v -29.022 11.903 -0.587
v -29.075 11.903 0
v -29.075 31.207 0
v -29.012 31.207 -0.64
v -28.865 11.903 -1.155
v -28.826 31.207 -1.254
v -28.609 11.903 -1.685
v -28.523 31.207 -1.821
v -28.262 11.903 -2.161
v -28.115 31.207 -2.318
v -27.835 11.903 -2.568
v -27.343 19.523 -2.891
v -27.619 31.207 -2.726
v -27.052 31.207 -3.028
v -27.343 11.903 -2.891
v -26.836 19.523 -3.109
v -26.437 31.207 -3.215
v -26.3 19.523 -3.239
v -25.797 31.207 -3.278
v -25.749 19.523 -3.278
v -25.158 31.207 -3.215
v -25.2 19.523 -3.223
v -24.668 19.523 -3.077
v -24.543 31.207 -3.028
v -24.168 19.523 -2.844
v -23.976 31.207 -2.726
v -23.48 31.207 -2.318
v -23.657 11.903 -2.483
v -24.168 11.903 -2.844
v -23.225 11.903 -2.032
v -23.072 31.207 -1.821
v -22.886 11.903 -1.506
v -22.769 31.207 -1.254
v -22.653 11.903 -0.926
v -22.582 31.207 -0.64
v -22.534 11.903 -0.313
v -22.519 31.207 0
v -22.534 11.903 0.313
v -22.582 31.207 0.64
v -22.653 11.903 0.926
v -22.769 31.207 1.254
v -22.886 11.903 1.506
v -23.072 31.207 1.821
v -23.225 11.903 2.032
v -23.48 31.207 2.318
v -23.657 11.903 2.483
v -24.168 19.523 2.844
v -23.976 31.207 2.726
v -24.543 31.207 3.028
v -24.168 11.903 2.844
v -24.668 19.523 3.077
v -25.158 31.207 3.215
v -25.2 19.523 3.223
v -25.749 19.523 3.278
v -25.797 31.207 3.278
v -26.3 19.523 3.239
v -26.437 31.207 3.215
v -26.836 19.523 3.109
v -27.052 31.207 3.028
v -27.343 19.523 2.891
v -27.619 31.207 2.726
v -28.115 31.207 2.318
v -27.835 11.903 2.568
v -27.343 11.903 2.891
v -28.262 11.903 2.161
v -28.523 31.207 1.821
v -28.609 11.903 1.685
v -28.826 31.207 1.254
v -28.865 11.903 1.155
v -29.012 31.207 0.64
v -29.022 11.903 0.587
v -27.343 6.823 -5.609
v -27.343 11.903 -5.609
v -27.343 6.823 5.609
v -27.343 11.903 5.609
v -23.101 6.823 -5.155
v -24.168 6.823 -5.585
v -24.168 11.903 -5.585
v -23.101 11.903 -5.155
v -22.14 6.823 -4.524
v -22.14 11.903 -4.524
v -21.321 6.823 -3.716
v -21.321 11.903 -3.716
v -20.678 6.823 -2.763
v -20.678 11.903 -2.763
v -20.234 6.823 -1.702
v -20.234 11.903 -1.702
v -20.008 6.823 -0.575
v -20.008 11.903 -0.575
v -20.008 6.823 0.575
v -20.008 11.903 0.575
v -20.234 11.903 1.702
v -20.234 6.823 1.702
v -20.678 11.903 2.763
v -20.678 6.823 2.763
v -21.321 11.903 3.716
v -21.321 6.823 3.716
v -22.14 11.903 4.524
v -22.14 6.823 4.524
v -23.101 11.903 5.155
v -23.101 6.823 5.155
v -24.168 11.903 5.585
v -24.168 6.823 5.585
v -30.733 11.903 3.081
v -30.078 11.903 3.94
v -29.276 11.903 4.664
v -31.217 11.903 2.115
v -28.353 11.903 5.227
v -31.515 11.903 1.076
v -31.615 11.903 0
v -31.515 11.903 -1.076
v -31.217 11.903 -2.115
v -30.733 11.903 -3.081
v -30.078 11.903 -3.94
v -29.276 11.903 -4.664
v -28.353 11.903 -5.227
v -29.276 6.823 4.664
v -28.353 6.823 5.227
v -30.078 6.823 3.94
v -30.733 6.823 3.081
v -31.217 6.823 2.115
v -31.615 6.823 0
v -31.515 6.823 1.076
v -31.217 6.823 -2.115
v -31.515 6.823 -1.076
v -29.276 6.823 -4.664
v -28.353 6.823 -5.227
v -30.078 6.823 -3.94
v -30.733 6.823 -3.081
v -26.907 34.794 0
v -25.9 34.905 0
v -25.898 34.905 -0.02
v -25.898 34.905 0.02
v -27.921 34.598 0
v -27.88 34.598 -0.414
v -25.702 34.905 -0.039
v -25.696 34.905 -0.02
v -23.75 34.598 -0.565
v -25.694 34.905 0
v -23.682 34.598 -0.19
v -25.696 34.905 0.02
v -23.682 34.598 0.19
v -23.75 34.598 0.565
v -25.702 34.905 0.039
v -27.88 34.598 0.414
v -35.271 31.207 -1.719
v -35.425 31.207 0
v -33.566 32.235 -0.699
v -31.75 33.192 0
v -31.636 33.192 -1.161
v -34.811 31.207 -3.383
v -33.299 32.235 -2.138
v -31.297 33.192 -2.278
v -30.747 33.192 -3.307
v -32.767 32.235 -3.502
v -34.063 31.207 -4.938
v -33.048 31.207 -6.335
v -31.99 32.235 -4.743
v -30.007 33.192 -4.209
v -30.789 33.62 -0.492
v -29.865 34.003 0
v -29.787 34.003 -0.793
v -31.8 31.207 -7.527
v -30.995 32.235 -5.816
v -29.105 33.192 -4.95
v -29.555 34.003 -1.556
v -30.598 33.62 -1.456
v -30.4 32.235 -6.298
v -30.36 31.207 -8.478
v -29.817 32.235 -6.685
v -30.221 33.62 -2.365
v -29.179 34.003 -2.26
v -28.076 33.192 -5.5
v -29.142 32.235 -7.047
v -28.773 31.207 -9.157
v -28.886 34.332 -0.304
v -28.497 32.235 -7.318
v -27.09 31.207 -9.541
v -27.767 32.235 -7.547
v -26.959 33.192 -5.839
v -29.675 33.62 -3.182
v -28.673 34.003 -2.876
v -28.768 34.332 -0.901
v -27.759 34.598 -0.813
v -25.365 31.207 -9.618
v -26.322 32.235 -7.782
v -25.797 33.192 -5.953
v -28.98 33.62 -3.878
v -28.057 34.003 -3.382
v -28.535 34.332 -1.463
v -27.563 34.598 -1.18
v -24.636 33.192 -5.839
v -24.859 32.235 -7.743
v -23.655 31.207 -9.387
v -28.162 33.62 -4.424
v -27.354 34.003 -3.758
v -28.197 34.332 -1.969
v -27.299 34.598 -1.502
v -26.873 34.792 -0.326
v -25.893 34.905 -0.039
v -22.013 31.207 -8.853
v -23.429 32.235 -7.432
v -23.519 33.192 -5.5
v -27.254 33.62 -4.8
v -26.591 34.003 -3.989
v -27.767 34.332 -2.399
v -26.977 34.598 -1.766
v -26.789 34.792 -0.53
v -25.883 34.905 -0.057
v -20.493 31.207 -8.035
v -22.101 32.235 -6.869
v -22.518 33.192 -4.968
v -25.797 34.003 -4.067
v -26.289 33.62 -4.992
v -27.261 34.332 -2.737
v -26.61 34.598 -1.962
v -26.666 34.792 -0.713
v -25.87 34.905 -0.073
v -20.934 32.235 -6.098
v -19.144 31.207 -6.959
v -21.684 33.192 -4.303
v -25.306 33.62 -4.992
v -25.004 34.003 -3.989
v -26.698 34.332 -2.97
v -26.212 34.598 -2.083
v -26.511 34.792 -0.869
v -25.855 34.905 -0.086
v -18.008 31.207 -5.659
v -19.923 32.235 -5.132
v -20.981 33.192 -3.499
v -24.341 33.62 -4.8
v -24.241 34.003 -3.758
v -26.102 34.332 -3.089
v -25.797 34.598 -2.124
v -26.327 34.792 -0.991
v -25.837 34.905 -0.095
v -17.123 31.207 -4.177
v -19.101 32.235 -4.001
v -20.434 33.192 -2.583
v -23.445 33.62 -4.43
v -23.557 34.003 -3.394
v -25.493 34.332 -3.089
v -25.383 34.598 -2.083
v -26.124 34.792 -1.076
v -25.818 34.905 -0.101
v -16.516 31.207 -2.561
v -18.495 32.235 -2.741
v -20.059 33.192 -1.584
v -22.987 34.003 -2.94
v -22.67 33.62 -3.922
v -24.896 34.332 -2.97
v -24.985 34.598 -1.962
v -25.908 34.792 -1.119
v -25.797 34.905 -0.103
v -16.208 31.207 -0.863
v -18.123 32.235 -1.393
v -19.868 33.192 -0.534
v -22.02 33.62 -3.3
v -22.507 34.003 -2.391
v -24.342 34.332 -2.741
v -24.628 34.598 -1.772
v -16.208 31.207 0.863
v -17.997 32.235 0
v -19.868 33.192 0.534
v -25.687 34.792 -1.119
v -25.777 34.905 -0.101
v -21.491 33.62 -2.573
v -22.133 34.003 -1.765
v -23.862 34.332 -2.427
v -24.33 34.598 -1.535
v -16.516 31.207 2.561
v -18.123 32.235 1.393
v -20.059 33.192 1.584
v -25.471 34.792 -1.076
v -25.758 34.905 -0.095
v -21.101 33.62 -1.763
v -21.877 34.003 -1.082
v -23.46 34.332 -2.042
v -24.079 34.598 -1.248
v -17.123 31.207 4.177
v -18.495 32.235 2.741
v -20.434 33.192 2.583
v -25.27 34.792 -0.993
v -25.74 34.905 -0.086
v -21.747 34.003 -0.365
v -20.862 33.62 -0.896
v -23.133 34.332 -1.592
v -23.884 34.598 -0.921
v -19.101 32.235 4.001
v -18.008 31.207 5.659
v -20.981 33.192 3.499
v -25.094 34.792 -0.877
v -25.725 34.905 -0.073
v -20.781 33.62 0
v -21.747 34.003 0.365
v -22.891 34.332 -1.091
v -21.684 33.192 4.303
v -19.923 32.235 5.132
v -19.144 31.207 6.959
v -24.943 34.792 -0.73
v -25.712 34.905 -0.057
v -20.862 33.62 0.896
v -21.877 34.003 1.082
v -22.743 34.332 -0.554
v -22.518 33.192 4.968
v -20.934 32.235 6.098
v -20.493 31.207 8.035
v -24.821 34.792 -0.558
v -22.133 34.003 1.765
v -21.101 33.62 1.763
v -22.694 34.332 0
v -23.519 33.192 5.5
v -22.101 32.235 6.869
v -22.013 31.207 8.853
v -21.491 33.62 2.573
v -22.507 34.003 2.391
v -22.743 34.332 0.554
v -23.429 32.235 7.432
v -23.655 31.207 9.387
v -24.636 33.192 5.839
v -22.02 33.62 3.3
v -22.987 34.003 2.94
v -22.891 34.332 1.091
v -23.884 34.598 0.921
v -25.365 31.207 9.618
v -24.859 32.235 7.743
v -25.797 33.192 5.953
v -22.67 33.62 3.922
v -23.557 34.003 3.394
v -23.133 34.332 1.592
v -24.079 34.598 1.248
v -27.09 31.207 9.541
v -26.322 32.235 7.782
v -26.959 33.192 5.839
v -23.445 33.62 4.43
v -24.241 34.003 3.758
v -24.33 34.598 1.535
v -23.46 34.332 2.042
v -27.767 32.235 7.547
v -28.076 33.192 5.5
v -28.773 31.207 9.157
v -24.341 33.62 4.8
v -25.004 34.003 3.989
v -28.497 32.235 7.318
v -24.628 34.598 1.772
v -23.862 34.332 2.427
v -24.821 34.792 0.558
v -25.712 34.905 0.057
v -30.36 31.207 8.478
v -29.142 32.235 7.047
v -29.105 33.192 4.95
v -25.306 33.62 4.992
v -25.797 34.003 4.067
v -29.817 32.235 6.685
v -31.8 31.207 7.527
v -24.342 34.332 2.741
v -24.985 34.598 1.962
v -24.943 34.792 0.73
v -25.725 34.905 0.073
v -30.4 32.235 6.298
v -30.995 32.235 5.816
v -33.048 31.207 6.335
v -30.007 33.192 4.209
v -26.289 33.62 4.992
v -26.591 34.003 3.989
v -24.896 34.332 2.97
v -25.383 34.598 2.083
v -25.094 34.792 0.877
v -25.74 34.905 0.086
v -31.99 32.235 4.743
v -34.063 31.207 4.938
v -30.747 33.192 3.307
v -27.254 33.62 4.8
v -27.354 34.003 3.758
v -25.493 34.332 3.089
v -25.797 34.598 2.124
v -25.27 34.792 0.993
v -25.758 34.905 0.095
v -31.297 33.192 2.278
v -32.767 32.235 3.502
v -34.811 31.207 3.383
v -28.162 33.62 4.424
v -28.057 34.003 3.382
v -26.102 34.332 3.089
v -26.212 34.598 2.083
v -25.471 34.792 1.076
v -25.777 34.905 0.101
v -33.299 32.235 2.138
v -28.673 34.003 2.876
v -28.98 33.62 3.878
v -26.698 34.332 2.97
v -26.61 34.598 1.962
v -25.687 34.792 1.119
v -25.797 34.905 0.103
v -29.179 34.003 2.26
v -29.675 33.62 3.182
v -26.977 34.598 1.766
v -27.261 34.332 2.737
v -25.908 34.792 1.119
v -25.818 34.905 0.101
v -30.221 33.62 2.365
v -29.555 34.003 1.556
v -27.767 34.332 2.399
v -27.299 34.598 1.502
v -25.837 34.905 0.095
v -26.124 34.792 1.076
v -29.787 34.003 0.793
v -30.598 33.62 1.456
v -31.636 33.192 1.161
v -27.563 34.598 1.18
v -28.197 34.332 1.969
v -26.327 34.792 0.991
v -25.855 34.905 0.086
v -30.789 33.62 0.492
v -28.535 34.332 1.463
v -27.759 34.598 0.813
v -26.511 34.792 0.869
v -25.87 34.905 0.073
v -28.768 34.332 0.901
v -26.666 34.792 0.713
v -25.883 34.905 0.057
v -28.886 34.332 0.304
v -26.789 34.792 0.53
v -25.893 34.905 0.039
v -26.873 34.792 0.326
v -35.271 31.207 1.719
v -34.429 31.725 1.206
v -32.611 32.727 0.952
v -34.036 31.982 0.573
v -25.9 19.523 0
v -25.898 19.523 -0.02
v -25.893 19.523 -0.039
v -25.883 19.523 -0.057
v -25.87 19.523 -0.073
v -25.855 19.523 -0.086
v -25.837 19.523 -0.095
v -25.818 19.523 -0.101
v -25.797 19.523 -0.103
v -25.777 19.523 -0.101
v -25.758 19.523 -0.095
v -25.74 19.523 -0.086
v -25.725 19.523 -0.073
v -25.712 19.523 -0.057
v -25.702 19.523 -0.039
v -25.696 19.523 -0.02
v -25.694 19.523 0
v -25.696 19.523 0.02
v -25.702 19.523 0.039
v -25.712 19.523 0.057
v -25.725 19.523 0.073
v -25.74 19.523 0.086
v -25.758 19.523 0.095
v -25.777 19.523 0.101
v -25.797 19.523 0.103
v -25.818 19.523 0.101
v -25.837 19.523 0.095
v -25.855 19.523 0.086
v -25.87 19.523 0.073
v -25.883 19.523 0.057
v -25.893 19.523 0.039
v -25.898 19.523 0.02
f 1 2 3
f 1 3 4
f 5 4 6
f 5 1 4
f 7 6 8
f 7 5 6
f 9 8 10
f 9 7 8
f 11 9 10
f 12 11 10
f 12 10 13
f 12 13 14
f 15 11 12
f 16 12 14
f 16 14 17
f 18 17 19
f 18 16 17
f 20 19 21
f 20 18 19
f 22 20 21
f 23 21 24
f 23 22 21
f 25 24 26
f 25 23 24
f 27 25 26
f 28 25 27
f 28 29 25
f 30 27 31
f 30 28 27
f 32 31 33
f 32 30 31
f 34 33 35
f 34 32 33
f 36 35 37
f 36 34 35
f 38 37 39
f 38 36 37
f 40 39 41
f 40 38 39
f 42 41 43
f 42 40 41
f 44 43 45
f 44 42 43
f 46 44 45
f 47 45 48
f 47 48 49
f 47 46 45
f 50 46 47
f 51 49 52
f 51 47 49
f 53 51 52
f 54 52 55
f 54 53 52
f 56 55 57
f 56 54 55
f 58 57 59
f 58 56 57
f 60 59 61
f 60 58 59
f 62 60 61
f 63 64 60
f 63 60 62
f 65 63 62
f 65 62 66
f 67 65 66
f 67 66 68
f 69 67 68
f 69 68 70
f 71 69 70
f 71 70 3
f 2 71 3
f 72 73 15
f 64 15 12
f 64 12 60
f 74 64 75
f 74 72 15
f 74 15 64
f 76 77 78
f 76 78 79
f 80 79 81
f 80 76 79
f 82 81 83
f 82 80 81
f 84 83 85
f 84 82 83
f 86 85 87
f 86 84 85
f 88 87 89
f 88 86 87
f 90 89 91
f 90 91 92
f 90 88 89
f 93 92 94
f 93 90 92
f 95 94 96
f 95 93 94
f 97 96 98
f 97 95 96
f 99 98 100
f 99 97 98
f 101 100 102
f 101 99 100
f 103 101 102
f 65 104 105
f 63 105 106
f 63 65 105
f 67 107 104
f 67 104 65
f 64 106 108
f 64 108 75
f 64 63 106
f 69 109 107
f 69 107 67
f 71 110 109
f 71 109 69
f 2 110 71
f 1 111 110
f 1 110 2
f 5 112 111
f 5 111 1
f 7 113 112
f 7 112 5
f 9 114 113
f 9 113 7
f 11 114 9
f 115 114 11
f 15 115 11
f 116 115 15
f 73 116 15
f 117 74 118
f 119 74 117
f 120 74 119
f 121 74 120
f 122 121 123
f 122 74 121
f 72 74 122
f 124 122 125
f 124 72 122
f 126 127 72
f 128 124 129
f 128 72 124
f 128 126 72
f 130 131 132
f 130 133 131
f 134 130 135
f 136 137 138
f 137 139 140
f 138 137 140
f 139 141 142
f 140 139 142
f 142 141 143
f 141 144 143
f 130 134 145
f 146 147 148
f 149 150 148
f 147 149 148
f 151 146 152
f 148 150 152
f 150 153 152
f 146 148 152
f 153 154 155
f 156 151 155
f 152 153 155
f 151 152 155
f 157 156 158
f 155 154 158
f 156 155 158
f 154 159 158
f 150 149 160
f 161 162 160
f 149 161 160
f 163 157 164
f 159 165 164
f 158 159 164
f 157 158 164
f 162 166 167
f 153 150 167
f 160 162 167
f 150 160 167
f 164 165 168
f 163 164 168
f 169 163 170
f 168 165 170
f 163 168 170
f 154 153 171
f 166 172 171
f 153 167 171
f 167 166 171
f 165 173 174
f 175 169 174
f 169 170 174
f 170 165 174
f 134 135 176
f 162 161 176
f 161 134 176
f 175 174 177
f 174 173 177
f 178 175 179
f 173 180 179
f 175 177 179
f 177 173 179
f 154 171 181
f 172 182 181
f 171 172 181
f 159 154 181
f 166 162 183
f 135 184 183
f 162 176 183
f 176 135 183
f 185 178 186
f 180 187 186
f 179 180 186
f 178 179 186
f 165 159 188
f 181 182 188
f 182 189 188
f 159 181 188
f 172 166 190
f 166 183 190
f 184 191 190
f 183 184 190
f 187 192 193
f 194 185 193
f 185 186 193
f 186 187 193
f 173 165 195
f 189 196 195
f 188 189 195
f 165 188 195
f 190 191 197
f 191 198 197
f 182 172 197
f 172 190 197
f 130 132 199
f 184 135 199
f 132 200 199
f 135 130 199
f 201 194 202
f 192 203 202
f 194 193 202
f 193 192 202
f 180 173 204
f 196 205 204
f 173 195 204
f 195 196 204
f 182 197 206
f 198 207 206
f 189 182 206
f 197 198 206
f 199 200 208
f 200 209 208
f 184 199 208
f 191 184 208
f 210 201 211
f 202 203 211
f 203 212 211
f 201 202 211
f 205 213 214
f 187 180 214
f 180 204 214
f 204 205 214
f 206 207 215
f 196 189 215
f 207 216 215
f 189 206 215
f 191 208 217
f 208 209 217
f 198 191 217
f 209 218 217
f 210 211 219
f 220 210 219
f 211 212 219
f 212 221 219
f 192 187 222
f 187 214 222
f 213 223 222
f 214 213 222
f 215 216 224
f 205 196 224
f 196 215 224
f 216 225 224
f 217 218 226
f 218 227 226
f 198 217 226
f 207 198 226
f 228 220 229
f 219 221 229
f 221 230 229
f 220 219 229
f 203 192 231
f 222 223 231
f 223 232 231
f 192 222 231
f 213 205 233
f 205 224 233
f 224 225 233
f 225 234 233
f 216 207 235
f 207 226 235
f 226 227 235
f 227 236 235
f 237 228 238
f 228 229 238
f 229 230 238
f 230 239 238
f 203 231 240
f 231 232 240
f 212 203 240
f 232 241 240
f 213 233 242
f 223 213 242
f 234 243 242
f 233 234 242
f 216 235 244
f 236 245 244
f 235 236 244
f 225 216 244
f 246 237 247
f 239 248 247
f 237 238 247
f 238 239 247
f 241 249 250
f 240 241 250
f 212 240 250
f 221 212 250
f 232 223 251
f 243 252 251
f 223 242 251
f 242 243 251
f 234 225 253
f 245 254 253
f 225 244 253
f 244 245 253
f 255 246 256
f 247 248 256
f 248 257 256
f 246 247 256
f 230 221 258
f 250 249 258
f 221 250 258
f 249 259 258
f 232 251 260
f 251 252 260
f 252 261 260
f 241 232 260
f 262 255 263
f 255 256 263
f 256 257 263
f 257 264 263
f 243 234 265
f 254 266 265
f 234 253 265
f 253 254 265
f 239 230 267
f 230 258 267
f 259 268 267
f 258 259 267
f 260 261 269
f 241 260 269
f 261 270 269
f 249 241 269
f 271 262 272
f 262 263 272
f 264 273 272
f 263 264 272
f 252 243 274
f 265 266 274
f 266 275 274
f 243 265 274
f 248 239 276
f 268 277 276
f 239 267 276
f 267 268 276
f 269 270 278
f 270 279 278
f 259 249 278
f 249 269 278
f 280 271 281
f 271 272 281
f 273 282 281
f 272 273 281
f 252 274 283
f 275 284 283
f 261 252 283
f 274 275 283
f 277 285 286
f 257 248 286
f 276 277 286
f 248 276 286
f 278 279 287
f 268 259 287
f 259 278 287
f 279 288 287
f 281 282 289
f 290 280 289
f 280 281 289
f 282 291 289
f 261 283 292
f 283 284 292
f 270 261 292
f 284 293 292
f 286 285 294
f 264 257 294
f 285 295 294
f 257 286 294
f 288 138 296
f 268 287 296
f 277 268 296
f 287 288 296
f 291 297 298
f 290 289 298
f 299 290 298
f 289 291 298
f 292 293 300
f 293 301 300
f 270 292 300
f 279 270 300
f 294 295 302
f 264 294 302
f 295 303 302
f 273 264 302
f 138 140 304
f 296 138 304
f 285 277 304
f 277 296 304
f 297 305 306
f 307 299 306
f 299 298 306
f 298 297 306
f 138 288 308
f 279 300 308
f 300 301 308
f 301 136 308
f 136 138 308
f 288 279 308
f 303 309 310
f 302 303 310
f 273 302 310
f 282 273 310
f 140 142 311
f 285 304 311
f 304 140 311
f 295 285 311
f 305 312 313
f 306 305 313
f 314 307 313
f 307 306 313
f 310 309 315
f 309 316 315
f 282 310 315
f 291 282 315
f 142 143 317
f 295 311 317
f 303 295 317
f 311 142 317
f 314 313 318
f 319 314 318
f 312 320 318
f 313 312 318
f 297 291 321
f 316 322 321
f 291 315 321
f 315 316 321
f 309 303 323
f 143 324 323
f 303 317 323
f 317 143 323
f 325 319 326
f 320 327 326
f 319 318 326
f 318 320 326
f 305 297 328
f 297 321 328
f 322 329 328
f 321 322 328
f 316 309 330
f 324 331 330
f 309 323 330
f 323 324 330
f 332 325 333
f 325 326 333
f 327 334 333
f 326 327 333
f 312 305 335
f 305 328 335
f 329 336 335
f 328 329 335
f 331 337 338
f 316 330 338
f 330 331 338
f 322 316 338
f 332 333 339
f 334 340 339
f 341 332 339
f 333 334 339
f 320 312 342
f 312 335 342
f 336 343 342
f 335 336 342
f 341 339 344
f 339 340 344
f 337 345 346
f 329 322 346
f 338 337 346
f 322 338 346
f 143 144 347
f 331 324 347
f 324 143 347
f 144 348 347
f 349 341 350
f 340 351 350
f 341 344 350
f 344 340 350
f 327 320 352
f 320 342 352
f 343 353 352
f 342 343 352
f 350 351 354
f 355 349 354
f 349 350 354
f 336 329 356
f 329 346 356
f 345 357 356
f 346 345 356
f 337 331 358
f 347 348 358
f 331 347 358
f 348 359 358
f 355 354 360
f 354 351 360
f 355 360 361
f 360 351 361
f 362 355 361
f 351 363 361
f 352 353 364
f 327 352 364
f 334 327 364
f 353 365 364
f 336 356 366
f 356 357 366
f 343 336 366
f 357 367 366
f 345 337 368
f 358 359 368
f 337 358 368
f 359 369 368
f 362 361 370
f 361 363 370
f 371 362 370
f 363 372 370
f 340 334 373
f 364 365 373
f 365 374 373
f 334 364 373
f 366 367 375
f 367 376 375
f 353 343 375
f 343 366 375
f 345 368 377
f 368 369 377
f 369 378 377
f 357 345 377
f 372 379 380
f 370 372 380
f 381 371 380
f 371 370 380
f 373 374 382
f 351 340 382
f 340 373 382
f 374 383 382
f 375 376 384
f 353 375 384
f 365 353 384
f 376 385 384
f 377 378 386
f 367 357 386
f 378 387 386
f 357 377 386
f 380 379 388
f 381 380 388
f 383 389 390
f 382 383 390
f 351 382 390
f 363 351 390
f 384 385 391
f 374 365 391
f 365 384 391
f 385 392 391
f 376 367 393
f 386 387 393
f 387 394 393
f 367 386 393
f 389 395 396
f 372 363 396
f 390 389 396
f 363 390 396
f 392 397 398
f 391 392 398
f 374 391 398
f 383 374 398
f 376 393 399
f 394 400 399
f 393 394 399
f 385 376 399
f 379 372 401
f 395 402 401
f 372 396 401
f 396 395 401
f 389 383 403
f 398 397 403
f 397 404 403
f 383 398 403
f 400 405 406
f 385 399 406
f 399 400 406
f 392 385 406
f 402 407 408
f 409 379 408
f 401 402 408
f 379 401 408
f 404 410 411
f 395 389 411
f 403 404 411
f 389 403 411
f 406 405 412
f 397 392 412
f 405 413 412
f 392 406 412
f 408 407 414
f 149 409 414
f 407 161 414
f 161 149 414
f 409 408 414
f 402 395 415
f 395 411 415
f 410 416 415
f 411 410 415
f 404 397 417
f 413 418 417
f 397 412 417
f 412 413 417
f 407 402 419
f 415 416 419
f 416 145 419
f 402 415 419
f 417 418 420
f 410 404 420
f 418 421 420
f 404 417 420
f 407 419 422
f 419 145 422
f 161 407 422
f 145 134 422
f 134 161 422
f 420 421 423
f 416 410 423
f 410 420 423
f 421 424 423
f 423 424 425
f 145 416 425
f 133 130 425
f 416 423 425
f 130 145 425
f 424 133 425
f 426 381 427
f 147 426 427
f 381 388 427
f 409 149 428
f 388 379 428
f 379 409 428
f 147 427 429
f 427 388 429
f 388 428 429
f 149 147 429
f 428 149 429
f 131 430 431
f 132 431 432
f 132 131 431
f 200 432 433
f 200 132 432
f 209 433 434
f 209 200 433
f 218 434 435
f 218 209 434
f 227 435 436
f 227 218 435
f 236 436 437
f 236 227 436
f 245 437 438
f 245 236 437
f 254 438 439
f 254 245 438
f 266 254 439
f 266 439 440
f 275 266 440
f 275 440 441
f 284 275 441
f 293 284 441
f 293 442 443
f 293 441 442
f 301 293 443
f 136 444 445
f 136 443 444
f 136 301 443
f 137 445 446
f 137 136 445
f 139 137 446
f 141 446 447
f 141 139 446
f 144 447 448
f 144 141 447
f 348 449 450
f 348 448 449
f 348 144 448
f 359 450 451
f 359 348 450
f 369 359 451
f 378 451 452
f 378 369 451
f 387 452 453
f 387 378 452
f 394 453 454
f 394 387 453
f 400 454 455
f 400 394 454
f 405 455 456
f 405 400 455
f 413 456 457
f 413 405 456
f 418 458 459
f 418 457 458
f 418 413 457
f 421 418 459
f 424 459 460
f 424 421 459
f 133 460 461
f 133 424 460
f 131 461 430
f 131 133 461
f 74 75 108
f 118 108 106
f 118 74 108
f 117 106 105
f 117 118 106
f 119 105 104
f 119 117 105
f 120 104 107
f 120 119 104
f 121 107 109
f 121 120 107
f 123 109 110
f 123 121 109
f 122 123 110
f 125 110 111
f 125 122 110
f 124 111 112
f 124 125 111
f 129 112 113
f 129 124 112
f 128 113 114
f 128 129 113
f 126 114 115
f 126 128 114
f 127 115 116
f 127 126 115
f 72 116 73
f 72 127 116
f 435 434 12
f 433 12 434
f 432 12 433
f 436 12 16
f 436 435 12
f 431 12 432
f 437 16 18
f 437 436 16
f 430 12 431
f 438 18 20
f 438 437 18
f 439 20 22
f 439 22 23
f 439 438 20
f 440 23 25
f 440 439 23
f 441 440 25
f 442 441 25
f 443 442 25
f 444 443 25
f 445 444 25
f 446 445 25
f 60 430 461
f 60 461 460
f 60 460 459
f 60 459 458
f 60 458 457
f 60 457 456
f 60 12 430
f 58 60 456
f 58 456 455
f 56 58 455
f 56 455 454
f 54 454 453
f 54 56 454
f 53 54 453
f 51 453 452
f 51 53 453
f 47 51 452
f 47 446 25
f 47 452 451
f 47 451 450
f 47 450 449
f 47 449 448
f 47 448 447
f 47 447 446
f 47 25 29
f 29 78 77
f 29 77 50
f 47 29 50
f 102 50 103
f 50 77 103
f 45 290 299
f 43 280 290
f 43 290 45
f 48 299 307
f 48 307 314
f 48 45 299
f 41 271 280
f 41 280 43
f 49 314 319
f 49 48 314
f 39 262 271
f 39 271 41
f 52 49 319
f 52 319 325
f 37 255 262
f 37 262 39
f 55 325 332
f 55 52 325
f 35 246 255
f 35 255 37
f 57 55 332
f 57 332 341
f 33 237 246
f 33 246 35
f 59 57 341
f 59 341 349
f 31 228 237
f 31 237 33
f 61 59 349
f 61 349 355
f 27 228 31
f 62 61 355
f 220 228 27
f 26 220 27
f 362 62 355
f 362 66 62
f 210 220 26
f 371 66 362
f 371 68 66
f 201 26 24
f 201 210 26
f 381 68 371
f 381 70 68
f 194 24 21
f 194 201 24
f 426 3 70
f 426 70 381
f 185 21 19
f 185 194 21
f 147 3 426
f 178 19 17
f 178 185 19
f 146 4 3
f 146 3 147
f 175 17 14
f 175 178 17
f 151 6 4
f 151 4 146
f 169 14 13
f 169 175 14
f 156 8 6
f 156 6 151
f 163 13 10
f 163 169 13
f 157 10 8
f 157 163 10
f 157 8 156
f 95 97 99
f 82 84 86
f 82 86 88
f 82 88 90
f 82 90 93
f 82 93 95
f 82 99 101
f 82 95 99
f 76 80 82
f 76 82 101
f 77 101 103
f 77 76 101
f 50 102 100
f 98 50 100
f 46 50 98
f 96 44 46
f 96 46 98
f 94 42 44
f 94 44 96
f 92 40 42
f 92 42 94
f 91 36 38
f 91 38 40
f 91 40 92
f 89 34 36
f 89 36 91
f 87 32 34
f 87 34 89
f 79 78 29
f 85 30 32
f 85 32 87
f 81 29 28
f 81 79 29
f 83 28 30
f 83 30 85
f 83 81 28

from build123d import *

# Parameters (mm, degrees)
F4_W     = 3.175
F4_H     = 12.7
F5_DEPTH = 12.7


with BuildPart() as f2:
    # F0 (on Top) → F2 (revolve)
    with BuildSketch(Plane.XY):
        with BuildLine():
            Line((-35.4254181015, 31.2067266416), (-29.0754181015, 31.2067266416))
            Line((-29.0754181015, 31.2067266416), (-29.0754181015, 11.9027266416))
            Line((-29.0754181015, 11.9027266416), (-31.6154181015, 11.9027266416))
            Line((-31.6154181015, 11.9027266416), (-31.6154181015, 6.8227266416))
            Line((-31.6154181015, 6.8227266416), (-25.9004181015, 6.8227266416))
            Line((-25.9004181015, 6.8227266416), (-25.9004181015, 20.6251591444))
            Line((-25.9004181015, 20.6251591444), (-25.9004181015, 34.9045594707))
            add(Edge.make_bspline(
                [(-35.4254181015, 31.2067266416), (-32.3843405864, 32.9409682845), (-29.3432630713, 34.6752099275), (-25.9004181015, 34.9045594707)],
                knots=[0, 0, 0, 0, 0.3470016692, 0.3470016692, 0.3470016692, 0.3470016692], degree=3))
        make_face()
    revolve(axis=Axis((-25.7974471897, 17.4531694502, 0), (0, -1, 0)))

    # F4 (on face) → F5 (cut)
    with BuildSketch(Plane.XZ.offset(-6.8227266416)):
        with Locations((-25.7551228888, 0)):
            Rectangle(F4_W, F4_H)
    extrude(amount=-F5_DEPTH, mode=Mode.SUBTRACT)


solid = f2.part
